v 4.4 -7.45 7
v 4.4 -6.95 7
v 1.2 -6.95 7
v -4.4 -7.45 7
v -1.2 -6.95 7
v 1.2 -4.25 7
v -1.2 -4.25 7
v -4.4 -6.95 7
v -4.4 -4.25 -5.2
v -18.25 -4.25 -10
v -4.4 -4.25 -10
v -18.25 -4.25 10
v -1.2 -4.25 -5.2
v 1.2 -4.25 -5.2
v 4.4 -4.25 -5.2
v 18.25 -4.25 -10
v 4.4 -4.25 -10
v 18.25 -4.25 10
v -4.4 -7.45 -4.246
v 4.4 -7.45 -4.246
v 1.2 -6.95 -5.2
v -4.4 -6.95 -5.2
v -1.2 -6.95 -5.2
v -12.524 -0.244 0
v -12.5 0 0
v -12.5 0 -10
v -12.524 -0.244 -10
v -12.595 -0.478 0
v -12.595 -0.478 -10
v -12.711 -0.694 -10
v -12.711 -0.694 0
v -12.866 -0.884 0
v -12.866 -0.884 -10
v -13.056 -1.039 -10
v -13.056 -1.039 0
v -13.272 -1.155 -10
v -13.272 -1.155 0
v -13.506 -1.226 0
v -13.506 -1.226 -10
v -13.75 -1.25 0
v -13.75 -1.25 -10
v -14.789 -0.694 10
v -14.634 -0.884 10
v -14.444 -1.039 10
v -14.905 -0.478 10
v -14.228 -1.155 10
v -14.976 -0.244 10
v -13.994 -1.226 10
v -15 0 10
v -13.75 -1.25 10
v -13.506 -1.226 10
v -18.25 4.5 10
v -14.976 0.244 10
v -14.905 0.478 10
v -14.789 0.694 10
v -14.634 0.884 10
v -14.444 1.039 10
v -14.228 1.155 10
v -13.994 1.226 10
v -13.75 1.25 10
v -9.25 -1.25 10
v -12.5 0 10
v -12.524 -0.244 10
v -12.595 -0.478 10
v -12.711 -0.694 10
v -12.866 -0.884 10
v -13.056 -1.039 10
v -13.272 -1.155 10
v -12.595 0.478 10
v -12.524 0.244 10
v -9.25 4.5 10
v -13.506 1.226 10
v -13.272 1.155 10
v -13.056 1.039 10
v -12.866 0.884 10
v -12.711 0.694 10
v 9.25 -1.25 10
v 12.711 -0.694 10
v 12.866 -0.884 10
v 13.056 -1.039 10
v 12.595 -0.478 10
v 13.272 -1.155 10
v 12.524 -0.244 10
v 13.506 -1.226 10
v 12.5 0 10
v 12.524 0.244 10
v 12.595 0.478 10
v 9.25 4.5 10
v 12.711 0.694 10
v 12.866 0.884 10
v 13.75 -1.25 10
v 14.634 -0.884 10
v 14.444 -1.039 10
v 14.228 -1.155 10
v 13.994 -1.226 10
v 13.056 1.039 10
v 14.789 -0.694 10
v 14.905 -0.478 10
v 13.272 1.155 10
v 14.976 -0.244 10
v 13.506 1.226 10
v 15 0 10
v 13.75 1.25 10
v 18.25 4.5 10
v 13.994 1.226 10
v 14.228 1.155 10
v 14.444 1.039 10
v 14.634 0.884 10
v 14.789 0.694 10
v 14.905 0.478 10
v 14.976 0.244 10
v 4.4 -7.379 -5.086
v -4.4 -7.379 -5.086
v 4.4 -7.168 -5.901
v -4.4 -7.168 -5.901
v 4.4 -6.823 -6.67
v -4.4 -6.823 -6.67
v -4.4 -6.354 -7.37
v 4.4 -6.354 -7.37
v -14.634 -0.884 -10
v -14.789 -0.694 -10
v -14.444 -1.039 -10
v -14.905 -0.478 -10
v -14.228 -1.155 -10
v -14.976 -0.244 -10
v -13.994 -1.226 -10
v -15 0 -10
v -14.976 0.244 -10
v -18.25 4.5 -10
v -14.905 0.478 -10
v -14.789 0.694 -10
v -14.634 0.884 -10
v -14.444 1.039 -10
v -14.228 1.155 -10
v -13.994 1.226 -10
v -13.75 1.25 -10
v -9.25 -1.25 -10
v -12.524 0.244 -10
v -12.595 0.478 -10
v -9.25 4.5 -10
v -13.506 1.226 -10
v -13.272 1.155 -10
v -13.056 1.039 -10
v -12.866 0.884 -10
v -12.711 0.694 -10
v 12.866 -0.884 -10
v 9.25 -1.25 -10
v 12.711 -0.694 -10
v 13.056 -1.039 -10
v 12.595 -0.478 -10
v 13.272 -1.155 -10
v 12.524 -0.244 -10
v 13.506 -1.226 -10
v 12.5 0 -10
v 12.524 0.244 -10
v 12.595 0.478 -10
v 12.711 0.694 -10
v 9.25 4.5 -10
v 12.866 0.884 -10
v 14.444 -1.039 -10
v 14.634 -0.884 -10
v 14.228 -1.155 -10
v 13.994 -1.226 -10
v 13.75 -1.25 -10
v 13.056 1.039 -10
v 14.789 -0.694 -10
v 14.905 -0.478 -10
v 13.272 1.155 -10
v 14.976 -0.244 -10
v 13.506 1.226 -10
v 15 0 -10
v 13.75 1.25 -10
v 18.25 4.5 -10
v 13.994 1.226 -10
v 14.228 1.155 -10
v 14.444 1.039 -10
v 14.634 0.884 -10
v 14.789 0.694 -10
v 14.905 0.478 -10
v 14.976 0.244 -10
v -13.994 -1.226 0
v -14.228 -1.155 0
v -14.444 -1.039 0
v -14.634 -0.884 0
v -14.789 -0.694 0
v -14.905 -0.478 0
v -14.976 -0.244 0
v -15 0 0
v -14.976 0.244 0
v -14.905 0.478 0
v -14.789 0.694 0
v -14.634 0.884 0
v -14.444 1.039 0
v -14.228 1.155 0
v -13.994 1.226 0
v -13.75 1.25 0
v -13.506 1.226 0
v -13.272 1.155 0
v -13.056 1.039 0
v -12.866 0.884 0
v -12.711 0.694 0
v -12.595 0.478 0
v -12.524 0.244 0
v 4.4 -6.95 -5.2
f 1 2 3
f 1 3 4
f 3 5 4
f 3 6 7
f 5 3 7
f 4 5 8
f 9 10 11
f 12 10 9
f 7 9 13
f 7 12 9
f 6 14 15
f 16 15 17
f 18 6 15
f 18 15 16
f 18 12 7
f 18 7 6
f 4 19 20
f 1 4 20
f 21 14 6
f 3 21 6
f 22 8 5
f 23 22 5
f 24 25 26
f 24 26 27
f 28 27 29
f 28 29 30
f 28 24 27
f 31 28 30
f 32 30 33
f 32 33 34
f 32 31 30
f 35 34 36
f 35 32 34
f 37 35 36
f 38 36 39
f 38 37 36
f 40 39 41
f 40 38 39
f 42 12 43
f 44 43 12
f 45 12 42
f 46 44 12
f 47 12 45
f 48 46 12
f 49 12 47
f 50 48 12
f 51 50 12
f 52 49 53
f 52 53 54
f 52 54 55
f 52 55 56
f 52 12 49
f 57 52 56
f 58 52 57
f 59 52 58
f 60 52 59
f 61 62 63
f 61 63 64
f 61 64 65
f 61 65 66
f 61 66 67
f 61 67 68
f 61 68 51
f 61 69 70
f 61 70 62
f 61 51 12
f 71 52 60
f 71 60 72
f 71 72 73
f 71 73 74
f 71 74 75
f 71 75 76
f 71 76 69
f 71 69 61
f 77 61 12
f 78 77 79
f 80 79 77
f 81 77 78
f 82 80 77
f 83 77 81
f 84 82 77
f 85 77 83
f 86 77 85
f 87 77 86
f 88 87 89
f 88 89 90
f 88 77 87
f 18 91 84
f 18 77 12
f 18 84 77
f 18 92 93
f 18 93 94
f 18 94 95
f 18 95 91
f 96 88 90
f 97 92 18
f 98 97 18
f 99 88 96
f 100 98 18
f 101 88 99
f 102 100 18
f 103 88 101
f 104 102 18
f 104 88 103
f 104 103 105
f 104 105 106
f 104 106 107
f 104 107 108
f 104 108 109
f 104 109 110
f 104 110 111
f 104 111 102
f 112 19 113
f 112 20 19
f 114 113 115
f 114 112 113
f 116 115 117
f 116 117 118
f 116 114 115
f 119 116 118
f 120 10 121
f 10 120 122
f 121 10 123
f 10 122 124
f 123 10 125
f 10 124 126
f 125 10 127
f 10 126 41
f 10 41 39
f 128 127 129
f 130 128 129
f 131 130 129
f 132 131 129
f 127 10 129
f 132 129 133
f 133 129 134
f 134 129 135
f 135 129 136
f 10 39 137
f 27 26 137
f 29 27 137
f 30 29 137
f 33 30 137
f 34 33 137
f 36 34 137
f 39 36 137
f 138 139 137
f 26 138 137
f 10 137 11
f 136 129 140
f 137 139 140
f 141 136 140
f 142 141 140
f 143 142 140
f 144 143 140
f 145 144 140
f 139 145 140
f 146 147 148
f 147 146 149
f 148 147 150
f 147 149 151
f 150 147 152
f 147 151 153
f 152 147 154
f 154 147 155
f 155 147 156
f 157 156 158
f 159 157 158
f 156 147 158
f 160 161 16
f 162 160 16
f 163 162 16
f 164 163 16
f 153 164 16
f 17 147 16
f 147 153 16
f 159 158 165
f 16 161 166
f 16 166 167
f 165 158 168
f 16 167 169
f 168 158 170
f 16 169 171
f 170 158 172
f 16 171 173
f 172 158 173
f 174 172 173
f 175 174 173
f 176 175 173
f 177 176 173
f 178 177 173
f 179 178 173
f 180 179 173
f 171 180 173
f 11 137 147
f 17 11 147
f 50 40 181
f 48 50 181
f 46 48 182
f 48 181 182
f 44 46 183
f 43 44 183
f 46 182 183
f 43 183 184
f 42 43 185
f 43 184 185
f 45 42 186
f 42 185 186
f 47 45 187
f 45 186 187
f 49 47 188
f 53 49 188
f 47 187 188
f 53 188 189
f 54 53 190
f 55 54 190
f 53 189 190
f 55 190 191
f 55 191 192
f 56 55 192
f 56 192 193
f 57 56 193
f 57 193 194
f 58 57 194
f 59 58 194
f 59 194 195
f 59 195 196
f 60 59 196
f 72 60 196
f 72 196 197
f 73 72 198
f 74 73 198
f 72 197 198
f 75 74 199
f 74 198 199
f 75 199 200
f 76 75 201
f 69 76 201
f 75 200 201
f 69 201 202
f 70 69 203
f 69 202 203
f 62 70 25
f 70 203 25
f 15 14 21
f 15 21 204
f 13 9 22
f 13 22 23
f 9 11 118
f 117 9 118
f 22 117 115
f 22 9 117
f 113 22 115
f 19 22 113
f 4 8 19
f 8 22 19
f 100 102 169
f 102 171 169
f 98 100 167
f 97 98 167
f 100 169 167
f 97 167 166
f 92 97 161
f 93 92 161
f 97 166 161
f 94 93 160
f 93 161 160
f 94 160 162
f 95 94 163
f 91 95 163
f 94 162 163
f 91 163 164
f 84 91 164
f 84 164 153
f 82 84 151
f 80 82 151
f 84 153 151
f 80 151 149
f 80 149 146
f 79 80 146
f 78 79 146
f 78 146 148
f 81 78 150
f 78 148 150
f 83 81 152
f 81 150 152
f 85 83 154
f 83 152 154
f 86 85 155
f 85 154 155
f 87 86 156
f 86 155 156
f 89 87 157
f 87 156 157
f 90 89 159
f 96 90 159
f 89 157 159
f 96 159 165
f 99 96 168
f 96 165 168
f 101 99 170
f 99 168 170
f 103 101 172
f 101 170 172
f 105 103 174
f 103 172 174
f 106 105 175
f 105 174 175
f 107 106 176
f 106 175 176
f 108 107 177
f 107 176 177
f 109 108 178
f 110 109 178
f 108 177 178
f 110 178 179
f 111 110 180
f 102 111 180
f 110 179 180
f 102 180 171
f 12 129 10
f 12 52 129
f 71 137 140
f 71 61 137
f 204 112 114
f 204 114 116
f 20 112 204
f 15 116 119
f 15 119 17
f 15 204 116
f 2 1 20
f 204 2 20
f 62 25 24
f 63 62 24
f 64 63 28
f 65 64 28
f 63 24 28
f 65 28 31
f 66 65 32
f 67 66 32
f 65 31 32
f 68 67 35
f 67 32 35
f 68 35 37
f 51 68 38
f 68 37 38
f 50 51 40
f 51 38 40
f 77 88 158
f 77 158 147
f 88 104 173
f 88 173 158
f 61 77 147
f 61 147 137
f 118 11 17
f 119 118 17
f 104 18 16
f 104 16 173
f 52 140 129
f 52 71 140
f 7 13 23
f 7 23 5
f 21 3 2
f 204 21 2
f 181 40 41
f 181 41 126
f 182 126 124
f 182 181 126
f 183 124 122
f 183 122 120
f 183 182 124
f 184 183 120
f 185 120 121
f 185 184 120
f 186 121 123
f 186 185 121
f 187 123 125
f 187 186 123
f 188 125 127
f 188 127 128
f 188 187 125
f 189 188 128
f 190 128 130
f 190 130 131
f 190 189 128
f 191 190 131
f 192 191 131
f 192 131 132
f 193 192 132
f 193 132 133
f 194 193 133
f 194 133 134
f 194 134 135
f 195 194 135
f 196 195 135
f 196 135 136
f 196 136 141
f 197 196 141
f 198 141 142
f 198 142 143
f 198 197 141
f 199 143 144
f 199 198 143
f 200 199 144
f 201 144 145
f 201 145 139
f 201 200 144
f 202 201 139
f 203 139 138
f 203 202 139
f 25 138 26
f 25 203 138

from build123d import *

# Parameters (mm, degrees)
F1_DEPTH = 10
F2_W     = 2.4
F2_H     = 12.2
F2_W_2   = 3.2
F2_H_2   = 1.8
F3_DEPTH = 2.7
F4_W     = 3.2
F4_H     = 12.2
F5_DEPTH = 0.5
F6_DEPTH = 3
F7_SIZE2 = 3.2
F7_SIZE  = 4
F8_R     = 5


with BuildPart() as f1:
    # F0 (on Top) → F1 (new body, symmetric)
    with BuildSketch(Plane.XY):
        Polygon((-9.25, -1.25), (-13.75, -1.25), (-18.25, -1.25), (-18.25, -4.25), (0, -4.25), (18.25, -4.25), (18.25, -1.25), (13.75, -1.25), (9.25, -1.25), (0, -1.25), align=None)
        Polygon((9.25, 4.5), (9.25, -1.25), (13.75, -1.25), (18.25, -1.25), (18.25, 4.5), align=None)
        with BuildLine():
            ThreePointArc((15, 0), (14.6338834765, -0.8838834765), (13.75, -1.25))
            ThreePointArc((13.75, -1.25), (12.8661165235, 0.8838834765), (15, 0))
        make_face(mode=Mode.SUBTRACT)
        Polygon((-18.25, -1.25), (-13.75, -1.25), (-9.25, -1.25), (-9.25, 4.5), (-18.25, 4.5), align=None)
        with BuildLine():
            ThreePointArc((-13.75, -1.25), (-14.6338834765, 0.8838834765), (-12.5, 0))
            ThreePointArc((-12.5, 0), (-12.8661165235, -0.8838834765), (-13.75, -1.25))
        make_face(mode=Mode.SUBTRACT)
    extrude(amount=F1_DEPTH, both=True)

    # F2 (on face) → F3 (join)
    with BuildSketch(Plane.XZ.offset(4.25)):
        with Locations((0, 0.9)):
            Rectangle(F2_W, F2_H)
        with Locations((-2.8, -6.1)):
            Rectangle(F2_W_2, F2_H_2)
        with Locations((0, -6.1)):
            Rectangle(F2_W, F2_H_2)
        with Locations((2.8, -6.1)):
            Rectangle(F2_W_2, F2_H_2)
    extrude(amount=F3_DEPTH)

    # F4 (on face) → F5 (join)
    with BuildSketch(Plane.XZ.offset(6.95)):
        with Locations((2.8, 0.9)):
            Rectangle(F4_W, F4_H)
        Polygon((-4.4, -5.2), (-4.4, -7), (4.4, -7), (4.4, -5.2), (1.2, -5.2), (1.2, 7), (-1.2, 7), (-1.2, -5.2), align=None)
        with Locations((-2.8, 0.9)):
            Rectangle(F4_W, F4_H)
    extrude(amount=F5_DEPTH)

    # F6 (add, through all): a face of the model
    f6_faces = [f1.faces().sort_by_distance(p)[0] for p in [
        (0, -5.85, -7),
    ]]
    extrude(f6_faces, amount=F6_DEPTH)

    # F7
    f7_edges = [f1.edges().sort_by_distance(p)[0] for p in [
        (0, -7.45, -10),
    ]]
    f7_side = f1.faces().sort_by_distance((0, -7.45, -1.5))[0]
    chamfer(f7_edges, length=F7_SIZE, length2=F7_SIZE2, reference=f7_side)

    # F8
    f8_edges = [f1.edges().sort_by_distance(p)[0] for p in [
        (0, -7.45, -6),
    ]]
    fillet(f8_edges, radius=F8_R)


solid = f1.part
